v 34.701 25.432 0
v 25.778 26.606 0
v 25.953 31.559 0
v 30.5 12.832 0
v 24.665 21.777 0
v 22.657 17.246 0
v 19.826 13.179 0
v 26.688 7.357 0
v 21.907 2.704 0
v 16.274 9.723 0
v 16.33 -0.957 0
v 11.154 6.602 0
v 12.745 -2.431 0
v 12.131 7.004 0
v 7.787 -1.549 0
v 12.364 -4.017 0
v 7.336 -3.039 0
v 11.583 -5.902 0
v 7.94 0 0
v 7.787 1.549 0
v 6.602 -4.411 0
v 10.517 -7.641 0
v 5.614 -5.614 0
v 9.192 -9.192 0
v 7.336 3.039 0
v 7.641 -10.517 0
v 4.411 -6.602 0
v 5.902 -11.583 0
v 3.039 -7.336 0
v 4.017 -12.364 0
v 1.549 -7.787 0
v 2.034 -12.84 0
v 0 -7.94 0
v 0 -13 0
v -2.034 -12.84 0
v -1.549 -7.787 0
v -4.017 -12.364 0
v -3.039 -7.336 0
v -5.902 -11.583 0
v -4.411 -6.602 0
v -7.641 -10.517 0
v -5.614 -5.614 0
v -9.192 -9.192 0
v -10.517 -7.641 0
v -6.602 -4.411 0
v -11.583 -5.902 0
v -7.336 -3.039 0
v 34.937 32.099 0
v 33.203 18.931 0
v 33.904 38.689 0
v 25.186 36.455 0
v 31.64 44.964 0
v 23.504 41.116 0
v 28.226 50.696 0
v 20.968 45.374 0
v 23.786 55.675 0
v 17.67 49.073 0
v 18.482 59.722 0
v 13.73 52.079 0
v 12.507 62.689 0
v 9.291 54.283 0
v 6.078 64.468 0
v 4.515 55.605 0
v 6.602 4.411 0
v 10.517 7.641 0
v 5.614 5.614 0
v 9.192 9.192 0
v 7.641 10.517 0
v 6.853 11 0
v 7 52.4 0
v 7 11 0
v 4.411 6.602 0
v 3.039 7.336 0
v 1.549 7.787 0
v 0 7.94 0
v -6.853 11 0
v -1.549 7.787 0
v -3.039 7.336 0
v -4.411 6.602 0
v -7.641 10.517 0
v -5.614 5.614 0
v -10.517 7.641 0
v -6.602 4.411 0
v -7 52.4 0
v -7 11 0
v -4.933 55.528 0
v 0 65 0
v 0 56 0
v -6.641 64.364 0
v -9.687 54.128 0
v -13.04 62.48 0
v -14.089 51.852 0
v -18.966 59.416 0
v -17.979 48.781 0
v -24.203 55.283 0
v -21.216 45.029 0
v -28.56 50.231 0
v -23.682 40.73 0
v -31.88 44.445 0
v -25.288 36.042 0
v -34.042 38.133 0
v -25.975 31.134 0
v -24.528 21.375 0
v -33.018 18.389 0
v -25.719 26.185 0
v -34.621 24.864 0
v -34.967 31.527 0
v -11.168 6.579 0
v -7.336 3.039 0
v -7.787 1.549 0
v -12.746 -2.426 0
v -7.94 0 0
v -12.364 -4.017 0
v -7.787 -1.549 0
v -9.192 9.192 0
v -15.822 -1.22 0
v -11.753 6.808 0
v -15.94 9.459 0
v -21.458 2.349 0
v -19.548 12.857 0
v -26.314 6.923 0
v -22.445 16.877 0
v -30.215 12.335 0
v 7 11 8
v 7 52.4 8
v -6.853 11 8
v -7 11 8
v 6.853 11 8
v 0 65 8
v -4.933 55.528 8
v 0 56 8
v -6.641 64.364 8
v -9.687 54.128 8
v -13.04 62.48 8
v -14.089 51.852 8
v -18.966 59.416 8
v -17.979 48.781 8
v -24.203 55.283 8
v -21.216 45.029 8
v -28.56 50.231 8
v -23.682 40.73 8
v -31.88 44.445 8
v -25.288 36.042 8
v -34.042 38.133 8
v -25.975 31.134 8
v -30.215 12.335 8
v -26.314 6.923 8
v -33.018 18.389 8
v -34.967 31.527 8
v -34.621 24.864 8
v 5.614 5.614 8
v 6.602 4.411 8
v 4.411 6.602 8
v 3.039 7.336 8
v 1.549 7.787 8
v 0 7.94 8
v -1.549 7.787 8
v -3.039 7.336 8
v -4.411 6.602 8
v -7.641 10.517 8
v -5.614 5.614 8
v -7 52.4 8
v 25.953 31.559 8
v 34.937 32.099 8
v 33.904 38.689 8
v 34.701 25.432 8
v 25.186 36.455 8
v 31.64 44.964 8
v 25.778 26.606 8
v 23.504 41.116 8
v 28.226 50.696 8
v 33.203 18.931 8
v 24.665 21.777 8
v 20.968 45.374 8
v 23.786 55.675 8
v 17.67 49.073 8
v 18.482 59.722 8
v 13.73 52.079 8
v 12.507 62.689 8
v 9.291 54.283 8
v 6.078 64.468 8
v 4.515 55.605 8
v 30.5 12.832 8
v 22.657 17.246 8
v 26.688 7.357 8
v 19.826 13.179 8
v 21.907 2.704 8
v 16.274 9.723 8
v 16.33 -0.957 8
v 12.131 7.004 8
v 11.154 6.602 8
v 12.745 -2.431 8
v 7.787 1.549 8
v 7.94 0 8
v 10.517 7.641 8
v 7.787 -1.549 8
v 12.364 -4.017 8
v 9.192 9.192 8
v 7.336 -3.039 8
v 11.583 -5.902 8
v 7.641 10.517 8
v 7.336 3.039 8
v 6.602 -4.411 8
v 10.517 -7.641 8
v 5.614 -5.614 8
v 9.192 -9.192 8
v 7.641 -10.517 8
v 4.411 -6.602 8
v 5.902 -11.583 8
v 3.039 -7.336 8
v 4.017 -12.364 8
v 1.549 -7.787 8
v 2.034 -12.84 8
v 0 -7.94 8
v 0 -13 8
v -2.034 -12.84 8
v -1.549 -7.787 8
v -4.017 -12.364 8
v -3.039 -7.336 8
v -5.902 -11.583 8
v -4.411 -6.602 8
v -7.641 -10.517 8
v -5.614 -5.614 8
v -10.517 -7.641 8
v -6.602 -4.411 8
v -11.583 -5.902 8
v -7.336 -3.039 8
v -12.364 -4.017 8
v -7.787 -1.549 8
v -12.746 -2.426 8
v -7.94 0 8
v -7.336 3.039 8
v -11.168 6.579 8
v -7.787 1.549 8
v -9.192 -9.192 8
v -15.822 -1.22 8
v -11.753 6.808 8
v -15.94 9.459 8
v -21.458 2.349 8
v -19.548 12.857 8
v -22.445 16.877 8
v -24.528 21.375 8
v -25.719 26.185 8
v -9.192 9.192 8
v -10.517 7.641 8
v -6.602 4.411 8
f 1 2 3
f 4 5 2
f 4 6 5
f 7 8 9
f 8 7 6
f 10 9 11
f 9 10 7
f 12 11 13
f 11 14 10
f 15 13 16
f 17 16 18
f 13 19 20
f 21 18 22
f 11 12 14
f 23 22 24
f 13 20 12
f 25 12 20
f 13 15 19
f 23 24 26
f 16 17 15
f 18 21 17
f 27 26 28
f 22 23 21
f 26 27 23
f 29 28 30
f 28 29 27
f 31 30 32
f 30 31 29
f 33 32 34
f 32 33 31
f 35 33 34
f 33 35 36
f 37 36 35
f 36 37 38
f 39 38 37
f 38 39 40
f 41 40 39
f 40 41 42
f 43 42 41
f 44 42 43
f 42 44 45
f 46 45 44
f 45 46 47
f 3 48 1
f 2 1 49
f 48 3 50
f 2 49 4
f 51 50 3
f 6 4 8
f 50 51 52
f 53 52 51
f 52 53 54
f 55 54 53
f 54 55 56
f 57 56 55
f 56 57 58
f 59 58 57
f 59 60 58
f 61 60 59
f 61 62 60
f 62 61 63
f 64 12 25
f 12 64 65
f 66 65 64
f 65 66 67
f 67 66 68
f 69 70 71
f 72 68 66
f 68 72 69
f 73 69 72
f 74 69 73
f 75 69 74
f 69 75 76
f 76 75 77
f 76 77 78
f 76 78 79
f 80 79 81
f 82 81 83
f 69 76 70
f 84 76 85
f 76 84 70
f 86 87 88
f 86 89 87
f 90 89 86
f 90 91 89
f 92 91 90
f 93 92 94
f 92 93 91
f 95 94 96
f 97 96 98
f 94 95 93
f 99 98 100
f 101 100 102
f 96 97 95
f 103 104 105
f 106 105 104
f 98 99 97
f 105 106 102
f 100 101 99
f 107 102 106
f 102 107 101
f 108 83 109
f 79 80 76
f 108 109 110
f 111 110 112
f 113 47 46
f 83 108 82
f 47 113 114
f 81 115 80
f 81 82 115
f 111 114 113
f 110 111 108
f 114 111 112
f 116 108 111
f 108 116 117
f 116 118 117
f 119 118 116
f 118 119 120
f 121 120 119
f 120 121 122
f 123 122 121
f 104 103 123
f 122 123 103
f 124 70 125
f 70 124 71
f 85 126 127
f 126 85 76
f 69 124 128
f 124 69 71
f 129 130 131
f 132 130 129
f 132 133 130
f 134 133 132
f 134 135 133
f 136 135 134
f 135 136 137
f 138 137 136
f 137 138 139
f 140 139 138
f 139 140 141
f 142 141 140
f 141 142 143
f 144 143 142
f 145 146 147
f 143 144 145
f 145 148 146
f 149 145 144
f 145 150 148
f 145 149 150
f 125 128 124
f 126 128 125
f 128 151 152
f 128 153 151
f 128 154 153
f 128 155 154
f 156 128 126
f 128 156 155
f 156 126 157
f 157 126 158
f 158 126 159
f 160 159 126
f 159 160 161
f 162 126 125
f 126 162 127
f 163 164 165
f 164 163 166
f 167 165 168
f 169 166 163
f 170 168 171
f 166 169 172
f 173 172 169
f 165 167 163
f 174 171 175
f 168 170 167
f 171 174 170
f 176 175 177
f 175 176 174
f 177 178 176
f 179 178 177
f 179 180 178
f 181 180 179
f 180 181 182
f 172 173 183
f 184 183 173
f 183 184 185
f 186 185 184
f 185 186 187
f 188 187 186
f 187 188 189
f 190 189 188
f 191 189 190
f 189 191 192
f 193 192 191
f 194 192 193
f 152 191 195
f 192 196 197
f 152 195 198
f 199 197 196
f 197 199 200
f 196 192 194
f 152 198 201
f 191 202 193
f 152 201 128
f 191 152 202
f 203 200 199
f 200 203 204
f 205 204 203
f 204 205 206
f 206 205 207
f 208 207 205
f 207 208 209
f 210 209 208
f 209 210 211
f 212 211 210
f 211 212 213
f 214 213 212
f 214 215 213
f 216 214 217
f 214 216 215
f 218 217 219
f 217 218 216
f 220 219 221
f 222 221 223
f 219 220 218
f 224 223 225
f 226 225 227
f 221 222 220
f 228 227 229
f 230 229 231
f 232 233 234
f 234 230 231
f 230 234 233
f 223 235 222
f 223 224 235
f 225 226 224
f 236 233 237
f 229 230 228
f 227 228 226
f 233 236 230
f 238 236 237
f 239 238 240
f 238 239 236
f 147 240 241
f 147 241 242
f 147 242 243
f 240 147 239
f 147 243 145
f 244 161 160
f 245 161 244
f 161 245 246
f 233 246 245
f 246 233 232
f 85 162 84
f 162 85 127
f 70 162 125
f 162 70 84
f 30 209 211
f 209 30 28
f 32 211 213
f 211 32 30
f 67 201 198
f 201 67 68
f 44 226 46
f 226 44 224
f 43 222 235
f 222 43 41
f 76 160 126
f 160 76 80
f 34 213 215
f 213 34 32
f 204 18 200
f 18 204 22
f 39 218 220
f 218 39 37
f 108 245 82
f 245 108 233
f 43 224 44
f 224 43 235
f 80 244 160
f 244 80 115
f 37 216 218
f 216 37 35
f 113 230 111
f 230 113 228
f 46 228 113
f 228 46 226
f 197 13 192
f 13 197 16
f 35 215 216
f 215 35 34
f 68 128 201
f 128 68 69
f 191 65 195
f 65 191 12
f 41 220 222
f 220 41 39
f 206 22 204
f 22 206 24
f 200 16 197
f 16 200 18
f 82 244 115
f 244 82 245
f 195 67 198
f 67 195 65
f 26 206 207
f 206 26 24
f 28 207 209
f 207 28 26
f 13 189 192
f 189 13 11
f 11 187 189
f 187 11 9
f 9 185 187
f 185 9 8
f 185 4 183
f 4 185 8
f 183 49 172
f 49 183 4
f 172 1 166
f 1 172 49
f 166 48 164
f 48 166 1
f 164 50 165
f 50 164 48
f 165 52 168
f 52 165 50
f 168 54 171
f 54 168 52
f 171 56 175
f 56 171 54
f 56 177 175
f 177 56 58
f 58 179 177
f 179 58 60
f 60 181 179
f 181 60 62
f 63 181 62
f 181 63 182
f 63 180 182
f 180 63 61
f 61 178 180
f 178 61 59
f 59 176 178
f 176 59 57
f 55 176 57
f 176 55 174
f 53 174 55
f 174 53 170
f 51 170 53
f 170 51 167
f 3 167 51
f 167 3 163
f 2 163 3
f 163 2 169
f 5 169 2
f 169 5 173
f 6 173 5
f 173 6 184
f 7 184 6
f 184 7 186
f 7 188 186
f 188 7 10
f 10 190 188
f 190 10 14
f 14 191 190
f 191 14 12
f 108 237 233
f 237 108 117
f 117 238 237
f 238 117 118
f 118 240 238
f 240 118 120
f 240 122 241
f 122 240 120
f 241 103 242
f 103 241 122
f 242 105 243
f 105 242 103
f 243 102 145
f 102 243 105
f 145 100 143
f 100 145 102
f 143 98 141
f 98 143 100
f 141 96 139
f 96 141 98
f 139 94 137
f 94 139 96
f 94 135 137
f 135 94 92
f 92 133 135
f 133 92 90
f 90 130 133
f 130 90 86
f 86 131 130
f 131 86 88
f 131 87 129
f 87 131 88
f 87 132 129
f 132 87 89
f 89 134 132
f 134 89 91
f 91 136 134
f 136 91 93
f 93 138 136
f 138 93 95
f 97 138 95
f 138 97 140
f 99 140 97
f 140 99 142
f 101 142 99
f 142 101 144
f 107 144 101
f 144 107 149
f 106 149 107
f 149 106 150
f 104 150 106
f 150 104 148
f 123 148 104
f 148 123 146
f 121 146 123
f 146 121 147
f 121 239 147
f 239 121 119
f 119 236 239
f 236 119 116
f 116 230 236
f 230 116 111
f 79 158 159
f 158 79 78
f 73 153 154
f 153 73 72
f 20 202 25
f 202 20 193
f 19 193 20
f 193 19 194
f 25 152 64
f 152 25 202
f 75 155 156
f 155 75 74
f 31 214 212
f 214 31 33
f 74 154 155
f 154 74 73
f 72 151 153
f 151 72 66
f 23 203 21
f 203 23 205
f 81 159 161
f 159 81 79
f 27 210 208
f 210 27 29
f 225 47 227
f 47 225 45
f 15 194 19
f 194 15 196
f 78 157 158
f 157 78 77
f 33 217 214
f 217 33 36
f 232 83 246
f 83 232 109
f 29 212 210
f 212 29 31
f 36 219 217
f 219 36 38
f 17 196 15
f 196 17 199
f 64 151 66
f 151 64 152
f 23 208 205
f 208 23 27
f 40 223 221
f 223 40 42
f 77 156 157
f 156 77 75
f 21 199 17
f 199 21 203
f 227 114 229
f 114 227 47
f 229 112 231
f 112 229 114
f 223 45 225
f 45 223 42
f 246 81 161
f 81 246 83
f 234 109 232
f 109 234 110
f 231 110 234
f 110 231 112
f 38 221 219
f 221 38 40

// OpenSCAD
$fn = 32;

// ----------------------------------------------------------------------
// Hook: 60 mm shank into a 26 mm curl, 8 mm thick
// ----------------------------------------------------------------------

// --- parameters (mm) ---
shank_len = 60;           // shank length from the boss centre
shank_w = 14;             // shank width
boss_d = 26;              // boss diameter
bore_d = 15.88;           // boss bore
curl_in = 26;             // curl inner radius
curl_out = 35;            // curl outer radius
curl_sweep = 350;         // curl sweep angle
hook_t = 8;               // hook thickness

shank_profile = [[-7, 52.4], [7, 52.4], [7, 11], [-7, 11]];
boss_profile = [[13, 0], [12.84, 2.034], [12.364, 4.017], [11.583, 5.902], [10.517, 7.641], [9.192, 9.192], [7.641, 10.517], [5.902, 11.583], [4.017, 12.364], [2.034, 12.84], [0, 13], [-2.034, 12.84], [-4.017, 12.364], [-5.902, 11.583], [-7.641, 10.517], [-9.192, 9.192], [-10.517, 7.641], [-11.583, 5.902], [-12.364, 4.017], [-12.84, 2.034], [-13, 0], [-12.84, -2.034], [-12.364, -4.017], [-11.583, -5.902], [-10.517, -7.641], [-9.192, -9.192], [-7.641, -10.517], [-5.902, -11.583], [-4.017, -12.364], [-2.034, -12.84], [0, -13], [2.034, -12.84], [4.017, -12.364], [5.902, -11.583], [7.641, -10.517], [9.192, -9.192], [10.517, -7.641], [11.583, -5.902], [12.364, -4.017], [12.84, -2.034]];
curl_profile = [[0, 65], [-6.641, 64.364], [-13.04, 62.48], [-18.966, 59.416], [-24.203, 55.283], [-28.56, 50.231], [-31.88, 44.445], [-34.042, 38.133], [-34.967, 31.527], [-34.621, 24.864], [-33.018, 18.389], [-30.215, 12.335], [-26.314, 6.923], [-21.458, 2.349], [-15.822, -1.22], [-9.611, -3.655], [-3.05, -4.867], [3.621, -4.812], [10.16, -3.493], [16.33, -0.957], [21.907, 2.704], [26.688, 7.357], [30.5, 12.832], [33.203, 18.931], [34.701, 25.432], [34.937, 32.099], [33.904, 38.689], [31.64, 44.964], [28.226, 50.696], [23.786, 55.675], [18.482, 59.722], [12.507, 62.689], [6.078, 64.468], [4.515, 55.605], [9.291, 54.283], [13.73, 52.079], [17.67, 49.073], [20.968, 45.374], [23.504, 41.116], [25.186, 36.455], [25.953, 31.559], [25.778, 26.606], [24.665, 21.777], [22.657, 17.246], [19.826, 13.179], [16.274, 9.723], [12.131, 7.004], [7.547, 5.12], [2.69, 4.139], [-2.266, 4.099], [-7.139, 4.999], [-11.753, 6.808], [-15.94, 9.459], [-19.548, 12.857], [-22.445, 16.877], [-24.528, 21.375], [-25.719, 26.185], [-25.975, 31.134], [-25.288, 36.042], [-23.682, 40.73], [-21.216, 45.029], [-17.979, 48.781], [-14.089, 51.852], [-9.687, 54.128], [-4.933, 55.528], [0, 56]];

difference() {
  union() {
    /* three overlapping outlines: shank, boss and the smooth curl */
    linear_extrude(height = hook_t) polygon(shank_profile);
    linear_extrude(height = hook_t) polygon(boss_profile);
    linear_extrude(height = hook_t) polygon(curl_profile);
  }
  translate([0, 0, -2.5]) cylinder(h = hook_t + 5, d = bore_d);
}
